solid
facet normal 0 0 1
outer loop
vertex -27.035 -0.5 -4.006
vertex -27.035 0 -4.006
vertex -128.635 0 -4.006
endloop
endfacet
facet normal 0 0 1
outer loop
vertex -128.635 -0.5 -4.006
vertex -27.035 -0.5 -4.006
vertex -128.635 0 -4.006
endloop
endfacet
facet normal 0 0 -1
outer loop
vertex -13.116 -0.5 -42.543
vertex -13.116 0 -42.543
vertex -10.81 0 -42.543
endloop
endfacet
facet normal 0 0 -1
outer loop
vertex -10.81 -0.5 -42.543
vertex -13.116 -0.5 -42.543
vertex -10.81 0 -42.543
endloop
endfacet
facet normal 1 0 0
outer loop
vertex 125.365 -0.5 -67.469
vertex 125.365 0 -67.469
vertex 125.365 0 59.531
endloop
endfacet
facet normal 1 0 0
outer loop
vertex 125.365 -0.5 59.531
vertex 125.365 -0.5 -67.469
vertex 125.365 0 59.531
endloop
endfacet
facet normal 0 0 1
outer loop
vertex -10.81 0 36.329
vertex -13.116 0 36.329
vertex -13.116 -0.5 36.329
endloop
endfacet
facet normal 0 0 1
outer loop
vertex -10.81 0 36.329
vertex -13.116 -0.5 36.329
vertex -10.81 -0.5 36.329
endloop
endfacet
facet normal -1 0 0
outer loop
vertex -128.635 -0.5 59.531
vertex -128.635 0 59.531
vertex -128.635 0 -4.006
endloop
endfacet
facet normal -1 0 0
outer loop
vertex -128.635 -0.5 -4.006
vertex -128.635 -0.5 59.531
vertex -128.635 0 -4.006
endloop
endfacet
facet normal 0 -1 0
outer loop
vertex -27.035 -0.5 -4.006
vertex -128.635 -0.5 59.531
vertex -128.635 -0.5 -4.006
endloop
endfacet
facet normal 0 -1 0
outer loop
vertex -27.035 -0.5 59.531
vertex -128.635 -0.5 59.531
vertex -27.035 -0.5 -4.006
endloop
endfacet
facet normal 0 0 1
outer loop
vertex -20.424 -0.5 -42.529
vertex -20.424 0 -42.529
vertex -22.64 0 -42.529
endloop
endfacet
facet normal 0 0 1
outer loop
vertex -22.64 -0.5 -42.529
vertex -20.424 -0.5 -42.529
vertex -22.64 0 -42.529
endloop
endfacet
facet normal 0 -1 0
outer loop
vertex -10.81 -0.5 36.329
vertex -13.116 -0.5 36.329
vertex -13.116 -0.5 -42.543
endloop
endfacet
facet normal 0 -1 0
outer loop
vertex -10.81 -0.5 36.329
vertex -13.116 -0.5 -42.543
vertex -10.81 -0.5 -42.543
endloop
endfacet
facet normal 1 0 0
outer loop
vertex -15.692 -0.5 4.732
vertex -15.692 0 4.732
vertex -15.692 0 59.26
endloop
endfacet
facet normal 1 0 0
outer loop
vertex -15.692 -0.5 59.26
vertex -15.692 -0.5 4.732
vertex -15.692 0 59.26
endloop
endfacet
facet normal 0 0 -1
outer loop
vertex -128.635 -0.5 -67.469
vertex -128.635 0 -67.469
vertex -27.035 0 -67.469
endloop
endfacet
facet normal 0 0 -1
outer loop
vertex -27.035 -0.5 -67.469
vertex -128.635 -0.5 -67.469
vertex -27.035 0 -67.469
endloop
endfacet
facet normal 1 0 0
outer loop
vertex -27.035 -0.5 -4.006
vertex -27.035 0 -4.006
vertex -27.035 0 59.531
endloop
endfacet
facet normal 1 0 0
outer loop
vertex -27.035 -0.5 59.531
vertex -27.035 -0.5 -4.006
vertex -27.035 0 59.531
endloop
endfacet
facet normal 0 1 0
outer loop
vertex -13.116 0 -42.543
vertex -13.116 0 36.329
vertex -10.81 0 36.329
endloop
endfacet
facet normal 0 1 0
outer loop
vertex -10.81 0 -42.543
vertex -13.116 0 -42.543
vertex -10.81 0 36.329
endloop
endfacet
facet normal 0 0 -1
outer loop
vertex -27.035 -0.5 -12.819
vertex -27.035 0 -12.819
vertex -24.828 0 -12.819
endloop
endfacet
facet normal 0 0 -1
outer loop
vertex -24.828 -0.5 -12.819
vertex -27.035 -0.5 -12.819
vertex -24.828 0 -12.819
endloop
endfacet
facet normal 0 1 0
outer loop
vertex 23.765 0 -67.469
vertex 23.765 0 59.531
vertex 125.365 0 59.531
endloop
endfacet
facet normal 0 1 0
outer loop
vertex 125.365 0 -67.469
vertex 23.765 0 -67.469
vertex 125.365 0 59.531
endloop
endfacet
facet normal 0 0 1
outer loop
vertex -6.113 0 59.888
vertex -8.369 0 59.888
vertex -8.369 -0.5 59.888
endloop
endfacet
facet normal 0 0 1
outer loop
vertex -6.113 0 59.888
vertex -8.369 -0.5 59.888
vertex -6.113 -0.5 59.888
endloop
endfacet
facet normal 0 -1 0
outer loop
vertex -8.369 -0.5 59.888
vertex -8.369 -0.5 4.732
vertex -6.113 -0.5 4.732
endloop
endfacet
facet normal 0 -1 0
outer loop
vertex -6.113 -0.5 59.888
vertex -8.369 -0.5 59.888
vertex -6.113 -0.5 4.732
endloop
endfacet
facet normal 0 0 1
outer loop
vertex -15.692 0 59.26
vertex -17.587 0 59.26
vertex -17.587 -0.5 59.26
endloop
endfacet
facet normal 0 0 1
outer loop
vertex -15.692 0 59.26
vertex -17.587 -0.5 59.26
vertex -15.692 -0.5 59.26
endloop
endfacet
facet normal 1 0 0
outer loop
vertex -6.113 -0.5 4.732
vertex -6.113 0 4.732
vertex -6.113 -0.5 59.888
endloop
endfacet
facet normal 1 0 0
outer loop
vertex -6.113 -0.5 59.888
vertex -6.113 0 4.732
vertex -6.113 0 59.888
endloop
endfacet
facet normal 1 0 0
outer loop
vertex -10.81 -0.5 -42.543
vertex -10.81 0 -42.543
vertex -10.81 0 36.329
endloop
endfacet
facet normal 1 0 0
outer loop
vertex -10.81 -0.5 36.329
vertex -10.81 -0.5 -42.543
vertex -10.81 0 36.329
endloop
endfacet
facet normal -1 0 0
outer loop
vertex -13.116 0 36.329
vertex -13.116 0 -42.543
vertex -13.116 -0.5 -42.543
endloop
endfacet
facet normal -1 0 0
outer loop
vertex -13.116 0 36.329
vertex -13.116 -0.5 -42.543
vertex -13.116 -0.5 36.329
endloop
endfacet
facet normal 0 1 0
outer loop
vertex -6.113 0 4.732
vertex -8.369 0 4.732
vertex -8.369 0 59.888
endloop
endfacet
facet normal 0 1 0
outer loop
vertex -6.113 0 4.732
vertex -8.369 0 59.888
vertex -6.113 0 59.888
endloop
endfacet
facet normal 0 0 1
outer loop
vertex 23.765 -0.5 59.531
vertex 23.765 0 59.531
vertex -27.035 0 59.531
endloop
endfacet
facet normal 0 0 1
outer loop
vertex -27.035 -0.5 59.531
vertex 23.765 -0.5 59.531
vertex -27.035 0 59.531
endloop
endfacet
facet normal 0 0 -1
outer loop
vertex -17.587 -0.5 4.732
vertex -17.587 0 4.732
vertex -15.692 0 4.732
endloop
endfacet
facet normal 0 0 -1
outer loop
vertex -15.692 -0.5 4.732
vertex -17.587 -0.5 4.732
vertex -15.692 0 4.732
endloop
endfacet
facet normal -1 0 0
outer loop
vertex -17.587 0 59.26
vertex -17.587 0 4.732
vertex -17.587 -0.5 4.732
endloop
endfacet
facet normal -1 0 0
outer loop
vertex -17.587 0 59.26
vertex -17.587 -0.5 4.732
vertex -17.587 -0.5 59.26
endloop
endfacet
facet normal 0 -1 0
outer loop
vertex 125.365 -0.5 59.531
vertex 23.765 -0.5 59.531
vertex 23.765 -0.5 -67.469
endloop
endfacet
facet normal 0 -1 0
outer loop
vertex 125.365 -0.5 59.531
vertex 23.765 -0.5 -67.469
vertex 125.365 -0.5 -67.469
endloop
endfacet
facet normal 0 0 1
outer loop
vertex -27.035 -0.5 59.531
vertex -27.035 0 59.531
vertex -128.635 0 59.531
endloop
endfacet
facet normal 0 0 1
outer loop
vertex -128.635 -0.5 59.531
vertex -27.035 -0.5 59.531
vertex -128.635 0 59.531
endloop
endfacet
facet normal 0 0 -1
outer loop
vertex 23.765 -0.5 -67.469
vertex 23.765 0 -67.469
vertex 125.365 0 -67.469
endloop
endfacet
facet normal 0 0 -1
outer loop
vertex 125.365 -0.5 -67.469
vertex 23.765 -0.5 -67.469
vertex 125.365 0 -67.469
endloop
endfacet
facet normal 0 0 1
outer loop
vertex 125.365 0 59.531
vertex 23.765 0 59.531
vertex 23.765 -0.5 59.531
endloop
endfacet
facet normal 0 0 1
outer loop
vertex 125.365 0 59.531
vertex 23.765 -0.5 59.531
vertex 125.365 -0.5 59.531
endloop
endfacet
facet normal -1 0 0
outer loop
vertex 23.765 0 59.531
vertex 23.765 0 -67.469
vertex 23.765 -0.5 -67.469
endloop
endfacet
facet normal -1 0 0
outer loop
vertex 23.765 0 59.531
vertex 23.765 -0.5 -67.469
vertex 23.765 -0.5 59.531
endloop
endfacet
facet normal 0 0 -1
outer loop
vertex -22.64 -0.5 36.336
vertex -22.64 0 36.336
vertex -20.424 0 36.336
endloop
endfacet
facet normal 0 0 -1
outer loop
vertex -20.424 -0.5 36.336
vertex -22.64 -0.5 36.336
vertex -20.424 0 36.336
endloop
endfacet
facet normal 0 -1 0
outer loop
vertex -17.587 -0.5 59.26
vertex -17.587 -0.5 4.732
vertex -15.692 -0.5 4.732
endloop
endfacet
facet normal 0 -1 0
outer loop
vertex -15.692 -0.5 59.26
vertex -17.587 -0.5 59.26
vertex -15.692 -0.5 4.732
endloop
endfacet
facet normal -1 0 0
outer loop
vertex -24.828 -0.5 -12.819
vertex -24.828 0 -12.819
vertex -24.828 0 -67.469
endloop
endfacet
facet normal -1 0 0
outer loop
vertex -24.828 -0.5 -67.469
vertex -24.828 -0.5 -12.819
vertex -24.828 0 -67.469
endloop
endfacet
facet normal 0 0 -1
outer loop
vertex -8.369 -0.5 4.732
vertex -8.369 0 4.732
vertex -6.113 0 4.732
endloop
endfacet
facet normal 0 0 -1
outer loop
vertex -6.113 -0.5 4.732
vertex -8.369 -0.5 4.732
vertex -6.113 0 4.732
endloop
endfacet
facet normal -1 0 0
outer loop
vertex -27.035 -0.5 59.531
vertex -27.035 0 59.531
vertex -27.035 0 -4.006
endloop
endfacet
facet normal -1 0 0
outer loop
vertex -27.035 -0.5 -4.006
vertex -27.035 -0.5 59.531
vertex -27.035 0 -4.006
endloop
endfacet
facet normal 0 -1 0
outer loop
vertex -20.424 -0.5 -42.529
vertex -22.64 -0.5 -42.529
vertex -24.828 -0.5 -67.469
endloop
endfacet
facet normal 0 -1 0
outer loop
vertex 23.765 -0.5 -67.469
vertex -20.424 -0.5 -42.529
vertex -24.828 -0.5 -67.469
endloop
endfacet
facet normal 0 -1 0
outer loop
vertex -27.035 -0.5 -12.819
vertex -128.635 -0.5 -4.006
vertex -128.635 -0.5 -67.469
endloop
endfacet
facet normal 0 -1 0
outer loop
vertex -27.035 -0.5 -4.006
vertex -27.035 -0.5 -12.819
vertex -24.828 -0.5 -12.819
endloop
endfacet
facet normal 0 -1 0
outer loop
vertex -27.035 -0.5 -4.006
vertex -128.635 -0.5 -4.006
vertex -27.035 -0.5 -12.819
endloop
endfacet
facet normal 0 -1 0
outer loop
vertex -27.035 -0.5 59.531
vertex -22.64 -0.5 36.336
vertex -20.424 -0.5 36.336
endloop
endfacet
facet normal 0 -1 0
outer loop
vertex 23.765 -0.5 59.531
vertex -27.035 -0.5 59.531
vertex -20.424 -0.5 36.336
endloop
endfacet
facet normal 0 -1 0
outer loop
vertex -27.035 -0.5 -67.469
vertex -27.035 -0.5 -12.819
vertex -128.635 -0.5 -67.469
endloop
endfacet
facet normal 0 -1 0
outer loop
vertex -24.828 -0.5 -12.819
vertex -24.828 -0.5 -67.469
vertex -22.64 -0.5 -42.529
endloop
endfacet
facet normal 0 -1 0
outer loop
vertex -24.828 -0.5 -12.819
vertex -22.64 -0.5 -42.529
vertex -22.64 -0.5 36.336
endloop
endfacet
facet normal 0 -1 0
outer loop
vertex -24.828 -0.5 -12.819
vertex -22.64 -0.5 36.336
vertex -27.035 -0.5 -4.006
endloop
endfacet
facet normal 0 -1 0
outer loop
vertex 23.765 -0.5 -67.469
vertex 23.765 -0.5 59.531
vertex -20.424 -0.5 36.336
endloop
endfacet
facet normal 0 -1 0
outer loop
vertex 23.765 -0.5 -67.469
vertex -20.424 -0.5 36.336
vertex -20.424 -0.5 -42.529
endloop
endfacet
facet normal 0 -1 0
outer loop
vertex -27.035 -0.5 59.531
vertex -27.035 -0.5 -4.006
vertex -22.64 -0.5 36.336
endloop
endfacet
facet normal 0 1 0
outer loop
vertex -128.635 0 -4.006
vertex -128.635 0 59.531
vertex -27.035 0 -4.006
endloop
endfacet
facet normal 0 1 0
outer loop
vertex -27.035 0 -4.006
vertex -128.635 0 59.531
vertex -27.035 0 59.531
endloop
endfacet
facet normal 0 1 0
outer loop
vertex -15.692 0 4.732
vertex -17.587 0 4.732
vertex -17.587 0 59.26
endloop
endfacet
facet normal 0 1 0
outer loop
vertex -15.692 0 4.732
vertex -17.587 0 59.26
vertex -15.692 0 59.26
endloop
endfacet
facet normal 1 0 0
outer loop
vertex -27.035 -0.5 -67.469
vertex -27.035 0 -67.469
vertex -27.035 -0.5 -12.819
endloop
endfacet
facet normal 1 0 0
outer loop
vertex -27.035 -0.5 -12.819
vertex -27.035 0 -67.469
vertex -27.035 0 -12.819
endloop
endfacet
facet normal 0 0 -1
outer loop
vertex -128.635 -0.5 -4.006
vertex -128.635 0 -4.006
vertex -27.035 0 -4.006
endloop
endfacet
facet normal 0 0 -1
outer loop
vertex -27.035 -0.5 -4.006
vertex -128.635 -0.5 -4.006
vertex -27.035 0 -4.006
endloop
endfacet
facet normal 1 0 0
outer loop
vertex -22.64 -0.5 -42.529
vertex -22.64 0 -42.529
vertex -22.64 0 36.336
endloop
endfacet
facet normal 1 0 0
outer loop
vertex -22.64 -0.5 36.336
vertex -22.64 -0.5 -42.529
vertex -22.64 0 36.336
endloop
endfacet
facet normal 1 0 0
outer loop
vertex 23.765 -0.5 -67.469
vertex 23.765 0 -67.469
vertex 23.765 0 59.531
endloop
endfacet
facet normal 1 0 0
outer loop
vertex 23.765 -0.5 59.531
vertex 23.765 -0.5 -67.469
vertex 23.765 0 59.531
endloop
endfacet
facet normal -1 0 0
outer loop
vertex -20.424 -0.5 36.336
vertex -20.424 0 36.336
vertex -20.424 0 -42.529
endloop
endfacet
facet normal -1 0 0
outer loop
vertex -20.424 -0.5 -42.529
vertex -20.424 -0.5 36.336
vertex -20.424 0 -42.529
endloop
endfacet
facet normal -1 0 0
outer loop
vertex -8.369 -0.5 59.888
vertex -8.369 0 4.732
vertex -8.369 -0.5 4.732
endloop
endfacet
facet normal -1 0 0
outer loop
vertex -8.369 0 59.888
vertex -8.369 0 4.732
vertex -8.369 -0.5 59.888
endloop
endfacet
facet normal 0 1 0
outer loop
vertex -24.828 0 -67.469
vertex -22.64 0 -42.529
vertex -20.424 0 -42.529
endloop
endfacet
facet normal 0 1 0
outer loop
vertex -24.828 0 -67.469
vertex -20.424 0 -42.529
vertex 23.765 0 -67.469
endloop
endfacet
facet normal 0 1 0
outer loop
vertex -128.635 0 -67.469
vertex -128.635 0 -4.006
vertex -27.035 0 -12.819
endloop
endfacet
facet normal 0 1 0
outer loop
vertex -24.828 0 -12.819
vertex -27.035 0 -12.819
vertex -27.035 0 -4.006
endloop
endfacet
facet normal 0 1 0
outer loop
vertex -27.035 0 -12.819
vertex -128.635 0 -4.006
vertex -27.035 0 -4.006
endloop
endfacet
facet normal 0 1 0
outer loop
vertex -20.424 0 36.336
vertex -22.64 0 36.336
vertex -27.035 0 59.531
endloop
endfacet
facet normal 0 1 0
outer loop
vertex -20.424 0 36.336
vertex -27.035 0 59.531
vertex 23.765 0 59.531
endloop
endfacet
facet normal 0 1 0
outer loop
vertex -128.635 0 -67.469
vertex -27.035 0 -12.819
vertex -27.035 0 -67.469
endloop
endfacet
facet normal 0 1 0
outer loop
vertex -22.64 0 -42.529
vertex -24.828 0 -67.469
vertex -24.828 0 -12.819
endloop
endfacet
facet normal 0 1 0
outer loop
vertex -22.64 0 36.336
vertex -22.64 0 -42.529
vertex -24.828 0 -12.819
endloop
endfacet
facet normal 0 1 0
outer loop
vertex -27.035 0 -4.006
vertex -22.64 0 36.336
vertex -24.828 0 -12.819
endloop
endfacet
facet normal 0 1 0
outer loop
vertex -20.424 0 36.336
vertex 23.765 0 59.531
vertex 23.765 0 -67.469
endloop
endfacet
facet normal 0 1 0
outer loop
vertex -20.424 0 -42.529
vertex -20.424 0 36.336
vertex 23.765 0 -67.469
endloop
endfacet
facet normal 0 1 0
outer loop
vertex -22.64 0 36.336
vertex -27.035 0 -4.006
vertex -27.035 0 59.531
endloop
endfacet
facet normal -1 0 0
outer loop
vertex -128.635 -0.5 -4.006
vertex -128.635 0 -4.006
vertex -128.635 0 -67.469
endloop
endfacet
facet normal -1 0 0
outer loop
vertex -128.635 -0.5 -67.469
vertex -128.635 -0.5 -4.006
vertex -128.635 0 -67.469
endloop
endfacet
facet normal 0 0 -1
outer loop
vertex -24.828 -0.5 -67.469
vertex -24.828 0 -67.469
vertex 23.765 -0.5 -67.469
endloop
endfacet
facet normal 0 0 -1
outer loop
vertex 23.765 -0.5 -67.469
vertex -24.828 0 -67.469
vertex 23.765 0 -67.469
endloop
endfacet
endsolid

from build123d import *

# Parameters (mm, degrees)
F4_DEPTH = 0.5
F2_W     = 101.6
F2_H     = 127
F1_W     = 1.8945392221
F1_H     = 54.5279430225
F1_W_2   = 2.3062070832
F1_H_2   = 78.8719132543
F1_W_3   = 2.2553699091
F1_H_3   = 55.1558332518


with BuildPart() as f4:
    # F3 (on face) → F4 (new body)
    with BuildSketch(Plane.XZ):
        Polygon((-27.0345257595, 59.457840398), (-27.0345257595, 59.5308371335), (-128.6345257595, 59.5308371335), (-128.6345257595, -3.9691628665), (-128.6345257595, -4.0056612343), (-27.0345257595, -4.0056612343), (-27.0345257595, 4.8075746745), align=None)
    extrude(amount=F4_DEPTH)


with BuildPart() as f4b:
    # F0 (on Front) → F4, piece 2 (new body)
    with BuildSketch(Plane.XZ):
        Polygon((-27.0345257595, -4.0056612343), (-128.6345257595, -4.0056612343), (-128.6345257595, -67.4691628665), (-27.0345257595, -67.4691628665), (-27.0345257595, -12.818897143), align=None)
        Polygon((-1.6345257595, 59.5308371335), (-1.982816495, 59.5308371335), (-1.982816495, -4.0056612343), (-20.4235240817, -4.0056612343), (-20.4235240817, -42.5288453698), (-22.6397402585, -42.5288453698), (-22.6397402585, -4.0056612343), (-27.0345257595, -4.0056612343), (-27.0345257595, -12.818897143), (-24.828478694, -12.818897143), (-24.828478694, -67.4691628665), (23.7654742405, -67.4691628665), (23.7654742405, 59.5308371335), align=None)
        Polygon((-1.982816495, 59.5308371335), (-27.0345257595, 59.5308371335), (-27.0345257595, 59.457840398), (-27.0345257595, 4.8075746745), (-27.0345257595, -4.0056612343), (-22.6397402585, -4.0056612343), (-22.6397402585, 36.3364890218), (-20.4235240817, 36.3364890218), (-20.4235240817, -4.0056612343), (-1.982816495, -4.0056612343), align=None)
    extrude(amount=F4_DEPTH)


with BuildPart() as f4c:
    # F2 (on face) → F4, piece 3 (new body)
    with BuildSketch(Plane.XZ):
        with Locations((74.5654742405, -3.9691628665)):
            Rectangle(F2_W, F2_H)
    extrude(amount=F4_DEPTH)


with BuildPart() as f4d:
    # F1 (on face) → F4, piece 4 (new body)
    with BuildSketch(Plane.XZ):
        with Locations((-16.639505513, 31.9959684275)):
            Rectangle(F1_W, F1_H)
    extrude(amount=F4_DEPTH)


with BuildPart() as f4e:
    # F1 (on face) → F4, piece 5 (new body)
    with BuildSketch(Plane.XZ):
        with Locations((-11.9626992382, -3.1067281961)):
            Rectangle(F1_W_2, F1_H_2)
    extrude(amount=F4_DEPTH)


with BuildPart() as f4f:
    # F1 (on face) → F4, piece 6 (new body)
    with BuildSketch(Plane.XZ):
        with Locations((-7.2409925051, 32.3099135421)):
            Rectangle(F1_W_3, F1_H_3)
    extrude(amount=F4_DEPTH)


solid = Compound([f4.part, f4b.part, f4c.part, f4d.part, f4e.part, f4f.part])
